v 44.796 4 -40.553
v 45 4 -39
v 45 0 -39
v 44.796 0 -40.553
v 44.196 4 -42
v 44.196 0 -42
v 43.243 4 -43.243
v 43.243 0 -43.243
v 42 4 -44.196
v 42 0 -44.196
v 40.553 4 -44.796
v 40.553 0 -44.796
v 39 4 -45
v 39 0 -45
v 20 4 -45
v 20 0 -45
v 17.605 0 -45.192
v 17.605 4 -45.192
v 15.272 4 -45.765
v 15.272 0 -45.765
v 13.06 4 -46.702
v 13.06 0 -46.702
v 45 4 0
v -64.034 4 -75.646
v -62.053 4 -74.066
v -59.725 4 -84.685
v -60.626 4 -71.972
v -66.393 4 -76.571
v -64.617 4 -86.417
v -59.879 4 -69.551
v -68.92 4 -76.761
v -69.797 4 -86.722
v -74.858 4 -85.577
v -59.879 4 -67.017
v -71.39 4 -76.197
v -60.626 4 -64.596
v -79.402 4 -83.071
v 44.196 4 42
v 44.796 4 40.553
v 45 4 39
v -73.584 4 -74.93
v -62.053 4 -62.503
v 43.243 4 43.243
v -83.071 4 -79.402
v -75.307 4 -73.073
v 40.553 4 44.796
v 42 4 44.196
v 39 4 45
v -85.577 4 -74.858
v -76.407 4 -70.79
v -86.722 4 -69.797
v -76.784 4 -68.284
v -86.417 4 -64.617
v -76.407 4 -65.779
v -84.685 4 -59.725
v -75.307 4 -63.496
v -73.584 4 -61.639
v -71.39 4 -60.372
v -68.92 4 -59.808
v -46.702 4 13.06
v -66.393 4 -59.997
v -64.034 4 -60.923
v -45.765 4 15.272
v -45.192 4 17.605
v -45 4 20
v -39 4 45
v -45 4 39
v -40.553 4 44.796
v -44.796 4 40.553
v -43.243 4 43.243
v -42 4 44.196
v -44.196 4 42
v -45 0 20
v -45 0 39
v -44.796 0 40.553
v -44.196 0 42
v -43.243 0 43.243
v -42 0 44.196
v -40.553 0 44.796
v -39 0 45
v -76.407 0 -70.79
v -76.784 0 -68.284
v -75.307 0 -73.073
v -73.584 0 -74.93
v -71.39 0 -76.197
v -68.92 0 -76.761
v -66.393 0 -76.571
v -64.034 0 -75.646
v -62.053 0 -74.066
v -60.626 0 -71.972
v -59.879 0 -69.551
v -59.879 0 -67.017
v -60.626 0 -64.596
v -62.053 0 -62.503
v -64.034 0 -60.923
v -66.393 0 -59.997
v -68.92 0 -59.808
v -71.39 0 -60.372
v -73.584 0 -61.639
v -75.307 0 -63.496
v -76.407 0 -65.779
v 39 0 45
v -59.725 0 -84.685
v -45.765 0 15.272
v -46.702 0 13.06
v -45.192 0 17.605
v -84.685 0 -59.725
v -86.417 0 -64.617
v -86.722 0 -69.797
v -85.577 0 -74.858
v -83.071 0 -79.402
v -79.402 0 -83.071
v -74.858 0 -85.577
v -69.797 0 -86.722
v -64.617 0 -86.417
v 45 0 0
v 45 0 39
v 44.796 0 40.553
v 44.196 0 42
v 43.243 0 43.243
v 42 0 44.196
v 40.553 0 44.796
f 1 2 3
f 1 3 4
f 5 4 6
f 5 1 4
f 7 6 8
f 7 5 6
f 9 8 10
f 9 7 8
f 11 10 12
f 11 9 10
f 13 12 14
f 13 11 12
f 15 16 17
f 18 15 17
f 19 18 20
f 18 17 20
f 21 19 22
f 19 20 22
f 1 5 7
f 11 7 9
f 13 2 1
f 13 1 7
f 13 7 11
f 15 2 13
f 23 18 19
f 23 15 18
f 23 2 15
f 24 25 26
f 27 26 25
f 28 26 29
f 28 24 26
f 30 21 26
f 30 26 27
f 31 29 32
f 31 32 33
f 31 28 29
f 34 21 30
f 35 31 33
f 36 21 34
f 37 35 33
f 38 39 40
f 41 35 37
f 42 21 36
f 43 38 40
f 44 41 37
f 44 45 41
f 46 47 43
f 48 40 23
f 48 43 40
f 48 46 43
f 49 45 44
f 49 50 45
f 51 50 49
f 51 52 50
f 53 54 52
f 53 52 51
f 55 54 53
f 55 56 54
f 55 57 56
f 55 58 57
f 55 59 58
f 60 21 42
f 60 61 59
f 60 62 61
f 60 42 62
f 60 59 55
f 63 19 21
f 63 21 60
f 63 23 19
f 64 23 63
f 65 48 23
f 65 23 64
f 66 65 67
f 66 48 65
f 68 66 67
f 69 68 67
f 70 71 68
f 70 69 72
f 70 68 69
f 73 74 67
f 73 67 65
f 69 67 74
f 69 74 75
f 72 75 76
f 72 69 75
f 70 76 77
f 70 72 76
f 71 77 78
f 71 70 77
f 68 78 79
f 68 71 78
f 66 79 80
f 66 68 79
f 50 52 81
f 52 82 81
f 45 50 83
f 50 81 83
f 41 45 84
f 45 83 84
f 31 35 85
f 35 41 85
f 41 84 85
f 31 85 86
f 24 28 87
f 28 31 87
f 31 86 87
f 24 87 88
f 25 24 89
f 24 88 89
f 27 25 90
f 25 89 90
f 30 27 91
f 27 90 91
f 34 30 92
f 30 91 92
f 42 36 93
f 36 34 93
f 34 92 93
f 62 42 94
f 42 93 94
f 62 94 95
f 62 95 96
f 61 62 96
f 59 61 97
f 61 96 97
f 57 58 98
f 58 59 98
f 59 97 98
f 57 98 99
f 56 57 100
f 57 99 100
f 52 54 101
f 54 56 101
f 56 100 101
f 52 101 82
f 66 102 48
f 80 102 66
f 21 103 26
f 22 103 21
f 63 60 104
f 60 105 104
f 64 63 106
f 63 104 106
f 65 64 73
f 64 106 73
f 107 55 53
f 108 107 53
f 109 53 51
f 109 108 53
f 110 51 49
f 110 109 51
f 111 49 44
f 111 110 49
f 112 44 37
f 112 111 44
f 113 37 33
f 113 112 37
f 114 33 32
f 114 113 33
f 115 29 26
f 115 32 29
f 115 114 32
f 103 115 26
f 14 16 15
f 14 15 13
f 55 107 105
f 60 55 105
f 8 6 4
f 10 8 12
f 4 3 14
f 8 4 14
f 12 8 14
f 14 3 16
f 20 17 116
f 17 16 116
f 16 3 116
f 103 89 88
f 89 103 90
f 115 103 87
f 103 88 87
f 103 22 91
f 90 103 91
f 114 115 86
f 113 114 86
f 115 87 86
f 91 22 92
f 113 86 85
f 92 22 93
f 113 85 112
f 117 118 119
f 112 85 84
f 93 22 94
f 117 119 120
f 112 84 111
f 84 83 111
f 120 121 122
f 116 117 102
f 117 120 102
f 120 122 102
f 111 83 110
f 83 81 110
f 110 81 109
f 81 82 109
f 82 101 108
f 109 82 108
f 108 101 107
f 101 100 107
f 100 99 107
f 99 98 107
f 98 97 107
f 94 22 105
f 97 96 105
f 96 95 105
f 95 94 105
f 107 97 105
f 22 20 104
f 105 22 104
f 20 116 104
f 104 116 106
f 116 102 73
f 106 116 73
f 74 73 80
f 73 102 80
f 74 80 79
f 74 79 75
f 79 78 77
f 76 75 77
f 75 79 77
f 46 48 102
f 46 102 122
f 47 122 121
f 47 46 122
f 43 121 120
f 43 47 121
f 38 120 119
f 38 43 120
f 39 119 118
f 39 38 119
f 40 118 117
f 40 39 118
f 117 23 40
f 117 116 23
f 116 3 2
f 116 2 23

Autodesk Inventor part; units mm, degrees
ref_plane "YZ Plane" through (0, 0, 0) normal (1, 0, 0) x (0, 1, 0)
ref_plane "XZ Plane" through (0, 0, 0) normal (0, 1, 0) x (-1, 0, 0)
ref_plane "XY Plane" through (0, 0, 0) normal (0, 0, 1) x (1, 0, 0)
sketch "Sketch1" plane through (0, 0, 0) normal (0, 1, 0) x (-1, 0, 0)
  line L0 (40, 40) -> (-40, 40) construction
  line L1 (-40, 40) -> (-40, -40) construction
  line L2 (-40, -40) -> (40, -40) construction
  line L3 (40, -40) -> (40, 40) construction
  line L4 (-40, 40) -> (40, -40) construction
  line L5 (0, 40) -> (0, -40) construction
  line L6 (-45, -45) -> (-45, 0)
  line L7 (-20, -45) -> (-45, -45)
  arc A0 (59.7253, -84.6853) -> (84.6853, -59.7253) centre (68.2843, -68.2843) ccw
  circle A1 centre (68.2843, -68.2843) radius 8.5
  line L8 (59.7253, -84.6853) -> (-13.0603, -46.7019)
  arc A2 (-13.0603, -46.7019) -> (-20, -45) centre (-20, -60) ccw
  arc A3 (84.6853, -59.7253) -> (59.7253, -84.6853) centre (68.2843, -68.2843) ccw construction
  line L9 (84.6853, -59.7253) -> (46.7019, 13.0603)
  line L10 (-45, 0) -> (-45, 45)
  line L11 (-45, 45) -> (45, 45)
  line L12 (45, 45) -> (45, 20)
  arc A4 (45, 20) -> (46.7019, 13.0603) centre (60, 20) ccw
  line L13 (40, 0) -> (45, 0) construction
  line L14 (0, 40) -> (0, 45) construction
  line L15 (-40, 0) -> (-45, 0) construction
  point P0 (0, 0)
  point P1 (0, 0)
  point P2 (0, 0)
  dimension "d2" = 80
  dimension "d3" = 80
  dimension "d29" = 5
  dimension "d30" = 17
  dimension "d31" = 10
  dimension "d32" = 40
  dimension "d34" = 5
  dimension "d35" = 15
  dimension "d36" = 25
extrude "Plate1" add sketch "Sketch1" along normal blind 4
fillet "Corner Round3" radius 6 3 edges at (-45, 2, 45) (45, 2, 45) (45, 2, -45)
equation "\"d34\" = d29"
equation "\"d6\" = Thickness"
equation "\"Thickness\" = 4"
properties part number "MSC 901 BASE PLATE" material "Stainless Steel"
